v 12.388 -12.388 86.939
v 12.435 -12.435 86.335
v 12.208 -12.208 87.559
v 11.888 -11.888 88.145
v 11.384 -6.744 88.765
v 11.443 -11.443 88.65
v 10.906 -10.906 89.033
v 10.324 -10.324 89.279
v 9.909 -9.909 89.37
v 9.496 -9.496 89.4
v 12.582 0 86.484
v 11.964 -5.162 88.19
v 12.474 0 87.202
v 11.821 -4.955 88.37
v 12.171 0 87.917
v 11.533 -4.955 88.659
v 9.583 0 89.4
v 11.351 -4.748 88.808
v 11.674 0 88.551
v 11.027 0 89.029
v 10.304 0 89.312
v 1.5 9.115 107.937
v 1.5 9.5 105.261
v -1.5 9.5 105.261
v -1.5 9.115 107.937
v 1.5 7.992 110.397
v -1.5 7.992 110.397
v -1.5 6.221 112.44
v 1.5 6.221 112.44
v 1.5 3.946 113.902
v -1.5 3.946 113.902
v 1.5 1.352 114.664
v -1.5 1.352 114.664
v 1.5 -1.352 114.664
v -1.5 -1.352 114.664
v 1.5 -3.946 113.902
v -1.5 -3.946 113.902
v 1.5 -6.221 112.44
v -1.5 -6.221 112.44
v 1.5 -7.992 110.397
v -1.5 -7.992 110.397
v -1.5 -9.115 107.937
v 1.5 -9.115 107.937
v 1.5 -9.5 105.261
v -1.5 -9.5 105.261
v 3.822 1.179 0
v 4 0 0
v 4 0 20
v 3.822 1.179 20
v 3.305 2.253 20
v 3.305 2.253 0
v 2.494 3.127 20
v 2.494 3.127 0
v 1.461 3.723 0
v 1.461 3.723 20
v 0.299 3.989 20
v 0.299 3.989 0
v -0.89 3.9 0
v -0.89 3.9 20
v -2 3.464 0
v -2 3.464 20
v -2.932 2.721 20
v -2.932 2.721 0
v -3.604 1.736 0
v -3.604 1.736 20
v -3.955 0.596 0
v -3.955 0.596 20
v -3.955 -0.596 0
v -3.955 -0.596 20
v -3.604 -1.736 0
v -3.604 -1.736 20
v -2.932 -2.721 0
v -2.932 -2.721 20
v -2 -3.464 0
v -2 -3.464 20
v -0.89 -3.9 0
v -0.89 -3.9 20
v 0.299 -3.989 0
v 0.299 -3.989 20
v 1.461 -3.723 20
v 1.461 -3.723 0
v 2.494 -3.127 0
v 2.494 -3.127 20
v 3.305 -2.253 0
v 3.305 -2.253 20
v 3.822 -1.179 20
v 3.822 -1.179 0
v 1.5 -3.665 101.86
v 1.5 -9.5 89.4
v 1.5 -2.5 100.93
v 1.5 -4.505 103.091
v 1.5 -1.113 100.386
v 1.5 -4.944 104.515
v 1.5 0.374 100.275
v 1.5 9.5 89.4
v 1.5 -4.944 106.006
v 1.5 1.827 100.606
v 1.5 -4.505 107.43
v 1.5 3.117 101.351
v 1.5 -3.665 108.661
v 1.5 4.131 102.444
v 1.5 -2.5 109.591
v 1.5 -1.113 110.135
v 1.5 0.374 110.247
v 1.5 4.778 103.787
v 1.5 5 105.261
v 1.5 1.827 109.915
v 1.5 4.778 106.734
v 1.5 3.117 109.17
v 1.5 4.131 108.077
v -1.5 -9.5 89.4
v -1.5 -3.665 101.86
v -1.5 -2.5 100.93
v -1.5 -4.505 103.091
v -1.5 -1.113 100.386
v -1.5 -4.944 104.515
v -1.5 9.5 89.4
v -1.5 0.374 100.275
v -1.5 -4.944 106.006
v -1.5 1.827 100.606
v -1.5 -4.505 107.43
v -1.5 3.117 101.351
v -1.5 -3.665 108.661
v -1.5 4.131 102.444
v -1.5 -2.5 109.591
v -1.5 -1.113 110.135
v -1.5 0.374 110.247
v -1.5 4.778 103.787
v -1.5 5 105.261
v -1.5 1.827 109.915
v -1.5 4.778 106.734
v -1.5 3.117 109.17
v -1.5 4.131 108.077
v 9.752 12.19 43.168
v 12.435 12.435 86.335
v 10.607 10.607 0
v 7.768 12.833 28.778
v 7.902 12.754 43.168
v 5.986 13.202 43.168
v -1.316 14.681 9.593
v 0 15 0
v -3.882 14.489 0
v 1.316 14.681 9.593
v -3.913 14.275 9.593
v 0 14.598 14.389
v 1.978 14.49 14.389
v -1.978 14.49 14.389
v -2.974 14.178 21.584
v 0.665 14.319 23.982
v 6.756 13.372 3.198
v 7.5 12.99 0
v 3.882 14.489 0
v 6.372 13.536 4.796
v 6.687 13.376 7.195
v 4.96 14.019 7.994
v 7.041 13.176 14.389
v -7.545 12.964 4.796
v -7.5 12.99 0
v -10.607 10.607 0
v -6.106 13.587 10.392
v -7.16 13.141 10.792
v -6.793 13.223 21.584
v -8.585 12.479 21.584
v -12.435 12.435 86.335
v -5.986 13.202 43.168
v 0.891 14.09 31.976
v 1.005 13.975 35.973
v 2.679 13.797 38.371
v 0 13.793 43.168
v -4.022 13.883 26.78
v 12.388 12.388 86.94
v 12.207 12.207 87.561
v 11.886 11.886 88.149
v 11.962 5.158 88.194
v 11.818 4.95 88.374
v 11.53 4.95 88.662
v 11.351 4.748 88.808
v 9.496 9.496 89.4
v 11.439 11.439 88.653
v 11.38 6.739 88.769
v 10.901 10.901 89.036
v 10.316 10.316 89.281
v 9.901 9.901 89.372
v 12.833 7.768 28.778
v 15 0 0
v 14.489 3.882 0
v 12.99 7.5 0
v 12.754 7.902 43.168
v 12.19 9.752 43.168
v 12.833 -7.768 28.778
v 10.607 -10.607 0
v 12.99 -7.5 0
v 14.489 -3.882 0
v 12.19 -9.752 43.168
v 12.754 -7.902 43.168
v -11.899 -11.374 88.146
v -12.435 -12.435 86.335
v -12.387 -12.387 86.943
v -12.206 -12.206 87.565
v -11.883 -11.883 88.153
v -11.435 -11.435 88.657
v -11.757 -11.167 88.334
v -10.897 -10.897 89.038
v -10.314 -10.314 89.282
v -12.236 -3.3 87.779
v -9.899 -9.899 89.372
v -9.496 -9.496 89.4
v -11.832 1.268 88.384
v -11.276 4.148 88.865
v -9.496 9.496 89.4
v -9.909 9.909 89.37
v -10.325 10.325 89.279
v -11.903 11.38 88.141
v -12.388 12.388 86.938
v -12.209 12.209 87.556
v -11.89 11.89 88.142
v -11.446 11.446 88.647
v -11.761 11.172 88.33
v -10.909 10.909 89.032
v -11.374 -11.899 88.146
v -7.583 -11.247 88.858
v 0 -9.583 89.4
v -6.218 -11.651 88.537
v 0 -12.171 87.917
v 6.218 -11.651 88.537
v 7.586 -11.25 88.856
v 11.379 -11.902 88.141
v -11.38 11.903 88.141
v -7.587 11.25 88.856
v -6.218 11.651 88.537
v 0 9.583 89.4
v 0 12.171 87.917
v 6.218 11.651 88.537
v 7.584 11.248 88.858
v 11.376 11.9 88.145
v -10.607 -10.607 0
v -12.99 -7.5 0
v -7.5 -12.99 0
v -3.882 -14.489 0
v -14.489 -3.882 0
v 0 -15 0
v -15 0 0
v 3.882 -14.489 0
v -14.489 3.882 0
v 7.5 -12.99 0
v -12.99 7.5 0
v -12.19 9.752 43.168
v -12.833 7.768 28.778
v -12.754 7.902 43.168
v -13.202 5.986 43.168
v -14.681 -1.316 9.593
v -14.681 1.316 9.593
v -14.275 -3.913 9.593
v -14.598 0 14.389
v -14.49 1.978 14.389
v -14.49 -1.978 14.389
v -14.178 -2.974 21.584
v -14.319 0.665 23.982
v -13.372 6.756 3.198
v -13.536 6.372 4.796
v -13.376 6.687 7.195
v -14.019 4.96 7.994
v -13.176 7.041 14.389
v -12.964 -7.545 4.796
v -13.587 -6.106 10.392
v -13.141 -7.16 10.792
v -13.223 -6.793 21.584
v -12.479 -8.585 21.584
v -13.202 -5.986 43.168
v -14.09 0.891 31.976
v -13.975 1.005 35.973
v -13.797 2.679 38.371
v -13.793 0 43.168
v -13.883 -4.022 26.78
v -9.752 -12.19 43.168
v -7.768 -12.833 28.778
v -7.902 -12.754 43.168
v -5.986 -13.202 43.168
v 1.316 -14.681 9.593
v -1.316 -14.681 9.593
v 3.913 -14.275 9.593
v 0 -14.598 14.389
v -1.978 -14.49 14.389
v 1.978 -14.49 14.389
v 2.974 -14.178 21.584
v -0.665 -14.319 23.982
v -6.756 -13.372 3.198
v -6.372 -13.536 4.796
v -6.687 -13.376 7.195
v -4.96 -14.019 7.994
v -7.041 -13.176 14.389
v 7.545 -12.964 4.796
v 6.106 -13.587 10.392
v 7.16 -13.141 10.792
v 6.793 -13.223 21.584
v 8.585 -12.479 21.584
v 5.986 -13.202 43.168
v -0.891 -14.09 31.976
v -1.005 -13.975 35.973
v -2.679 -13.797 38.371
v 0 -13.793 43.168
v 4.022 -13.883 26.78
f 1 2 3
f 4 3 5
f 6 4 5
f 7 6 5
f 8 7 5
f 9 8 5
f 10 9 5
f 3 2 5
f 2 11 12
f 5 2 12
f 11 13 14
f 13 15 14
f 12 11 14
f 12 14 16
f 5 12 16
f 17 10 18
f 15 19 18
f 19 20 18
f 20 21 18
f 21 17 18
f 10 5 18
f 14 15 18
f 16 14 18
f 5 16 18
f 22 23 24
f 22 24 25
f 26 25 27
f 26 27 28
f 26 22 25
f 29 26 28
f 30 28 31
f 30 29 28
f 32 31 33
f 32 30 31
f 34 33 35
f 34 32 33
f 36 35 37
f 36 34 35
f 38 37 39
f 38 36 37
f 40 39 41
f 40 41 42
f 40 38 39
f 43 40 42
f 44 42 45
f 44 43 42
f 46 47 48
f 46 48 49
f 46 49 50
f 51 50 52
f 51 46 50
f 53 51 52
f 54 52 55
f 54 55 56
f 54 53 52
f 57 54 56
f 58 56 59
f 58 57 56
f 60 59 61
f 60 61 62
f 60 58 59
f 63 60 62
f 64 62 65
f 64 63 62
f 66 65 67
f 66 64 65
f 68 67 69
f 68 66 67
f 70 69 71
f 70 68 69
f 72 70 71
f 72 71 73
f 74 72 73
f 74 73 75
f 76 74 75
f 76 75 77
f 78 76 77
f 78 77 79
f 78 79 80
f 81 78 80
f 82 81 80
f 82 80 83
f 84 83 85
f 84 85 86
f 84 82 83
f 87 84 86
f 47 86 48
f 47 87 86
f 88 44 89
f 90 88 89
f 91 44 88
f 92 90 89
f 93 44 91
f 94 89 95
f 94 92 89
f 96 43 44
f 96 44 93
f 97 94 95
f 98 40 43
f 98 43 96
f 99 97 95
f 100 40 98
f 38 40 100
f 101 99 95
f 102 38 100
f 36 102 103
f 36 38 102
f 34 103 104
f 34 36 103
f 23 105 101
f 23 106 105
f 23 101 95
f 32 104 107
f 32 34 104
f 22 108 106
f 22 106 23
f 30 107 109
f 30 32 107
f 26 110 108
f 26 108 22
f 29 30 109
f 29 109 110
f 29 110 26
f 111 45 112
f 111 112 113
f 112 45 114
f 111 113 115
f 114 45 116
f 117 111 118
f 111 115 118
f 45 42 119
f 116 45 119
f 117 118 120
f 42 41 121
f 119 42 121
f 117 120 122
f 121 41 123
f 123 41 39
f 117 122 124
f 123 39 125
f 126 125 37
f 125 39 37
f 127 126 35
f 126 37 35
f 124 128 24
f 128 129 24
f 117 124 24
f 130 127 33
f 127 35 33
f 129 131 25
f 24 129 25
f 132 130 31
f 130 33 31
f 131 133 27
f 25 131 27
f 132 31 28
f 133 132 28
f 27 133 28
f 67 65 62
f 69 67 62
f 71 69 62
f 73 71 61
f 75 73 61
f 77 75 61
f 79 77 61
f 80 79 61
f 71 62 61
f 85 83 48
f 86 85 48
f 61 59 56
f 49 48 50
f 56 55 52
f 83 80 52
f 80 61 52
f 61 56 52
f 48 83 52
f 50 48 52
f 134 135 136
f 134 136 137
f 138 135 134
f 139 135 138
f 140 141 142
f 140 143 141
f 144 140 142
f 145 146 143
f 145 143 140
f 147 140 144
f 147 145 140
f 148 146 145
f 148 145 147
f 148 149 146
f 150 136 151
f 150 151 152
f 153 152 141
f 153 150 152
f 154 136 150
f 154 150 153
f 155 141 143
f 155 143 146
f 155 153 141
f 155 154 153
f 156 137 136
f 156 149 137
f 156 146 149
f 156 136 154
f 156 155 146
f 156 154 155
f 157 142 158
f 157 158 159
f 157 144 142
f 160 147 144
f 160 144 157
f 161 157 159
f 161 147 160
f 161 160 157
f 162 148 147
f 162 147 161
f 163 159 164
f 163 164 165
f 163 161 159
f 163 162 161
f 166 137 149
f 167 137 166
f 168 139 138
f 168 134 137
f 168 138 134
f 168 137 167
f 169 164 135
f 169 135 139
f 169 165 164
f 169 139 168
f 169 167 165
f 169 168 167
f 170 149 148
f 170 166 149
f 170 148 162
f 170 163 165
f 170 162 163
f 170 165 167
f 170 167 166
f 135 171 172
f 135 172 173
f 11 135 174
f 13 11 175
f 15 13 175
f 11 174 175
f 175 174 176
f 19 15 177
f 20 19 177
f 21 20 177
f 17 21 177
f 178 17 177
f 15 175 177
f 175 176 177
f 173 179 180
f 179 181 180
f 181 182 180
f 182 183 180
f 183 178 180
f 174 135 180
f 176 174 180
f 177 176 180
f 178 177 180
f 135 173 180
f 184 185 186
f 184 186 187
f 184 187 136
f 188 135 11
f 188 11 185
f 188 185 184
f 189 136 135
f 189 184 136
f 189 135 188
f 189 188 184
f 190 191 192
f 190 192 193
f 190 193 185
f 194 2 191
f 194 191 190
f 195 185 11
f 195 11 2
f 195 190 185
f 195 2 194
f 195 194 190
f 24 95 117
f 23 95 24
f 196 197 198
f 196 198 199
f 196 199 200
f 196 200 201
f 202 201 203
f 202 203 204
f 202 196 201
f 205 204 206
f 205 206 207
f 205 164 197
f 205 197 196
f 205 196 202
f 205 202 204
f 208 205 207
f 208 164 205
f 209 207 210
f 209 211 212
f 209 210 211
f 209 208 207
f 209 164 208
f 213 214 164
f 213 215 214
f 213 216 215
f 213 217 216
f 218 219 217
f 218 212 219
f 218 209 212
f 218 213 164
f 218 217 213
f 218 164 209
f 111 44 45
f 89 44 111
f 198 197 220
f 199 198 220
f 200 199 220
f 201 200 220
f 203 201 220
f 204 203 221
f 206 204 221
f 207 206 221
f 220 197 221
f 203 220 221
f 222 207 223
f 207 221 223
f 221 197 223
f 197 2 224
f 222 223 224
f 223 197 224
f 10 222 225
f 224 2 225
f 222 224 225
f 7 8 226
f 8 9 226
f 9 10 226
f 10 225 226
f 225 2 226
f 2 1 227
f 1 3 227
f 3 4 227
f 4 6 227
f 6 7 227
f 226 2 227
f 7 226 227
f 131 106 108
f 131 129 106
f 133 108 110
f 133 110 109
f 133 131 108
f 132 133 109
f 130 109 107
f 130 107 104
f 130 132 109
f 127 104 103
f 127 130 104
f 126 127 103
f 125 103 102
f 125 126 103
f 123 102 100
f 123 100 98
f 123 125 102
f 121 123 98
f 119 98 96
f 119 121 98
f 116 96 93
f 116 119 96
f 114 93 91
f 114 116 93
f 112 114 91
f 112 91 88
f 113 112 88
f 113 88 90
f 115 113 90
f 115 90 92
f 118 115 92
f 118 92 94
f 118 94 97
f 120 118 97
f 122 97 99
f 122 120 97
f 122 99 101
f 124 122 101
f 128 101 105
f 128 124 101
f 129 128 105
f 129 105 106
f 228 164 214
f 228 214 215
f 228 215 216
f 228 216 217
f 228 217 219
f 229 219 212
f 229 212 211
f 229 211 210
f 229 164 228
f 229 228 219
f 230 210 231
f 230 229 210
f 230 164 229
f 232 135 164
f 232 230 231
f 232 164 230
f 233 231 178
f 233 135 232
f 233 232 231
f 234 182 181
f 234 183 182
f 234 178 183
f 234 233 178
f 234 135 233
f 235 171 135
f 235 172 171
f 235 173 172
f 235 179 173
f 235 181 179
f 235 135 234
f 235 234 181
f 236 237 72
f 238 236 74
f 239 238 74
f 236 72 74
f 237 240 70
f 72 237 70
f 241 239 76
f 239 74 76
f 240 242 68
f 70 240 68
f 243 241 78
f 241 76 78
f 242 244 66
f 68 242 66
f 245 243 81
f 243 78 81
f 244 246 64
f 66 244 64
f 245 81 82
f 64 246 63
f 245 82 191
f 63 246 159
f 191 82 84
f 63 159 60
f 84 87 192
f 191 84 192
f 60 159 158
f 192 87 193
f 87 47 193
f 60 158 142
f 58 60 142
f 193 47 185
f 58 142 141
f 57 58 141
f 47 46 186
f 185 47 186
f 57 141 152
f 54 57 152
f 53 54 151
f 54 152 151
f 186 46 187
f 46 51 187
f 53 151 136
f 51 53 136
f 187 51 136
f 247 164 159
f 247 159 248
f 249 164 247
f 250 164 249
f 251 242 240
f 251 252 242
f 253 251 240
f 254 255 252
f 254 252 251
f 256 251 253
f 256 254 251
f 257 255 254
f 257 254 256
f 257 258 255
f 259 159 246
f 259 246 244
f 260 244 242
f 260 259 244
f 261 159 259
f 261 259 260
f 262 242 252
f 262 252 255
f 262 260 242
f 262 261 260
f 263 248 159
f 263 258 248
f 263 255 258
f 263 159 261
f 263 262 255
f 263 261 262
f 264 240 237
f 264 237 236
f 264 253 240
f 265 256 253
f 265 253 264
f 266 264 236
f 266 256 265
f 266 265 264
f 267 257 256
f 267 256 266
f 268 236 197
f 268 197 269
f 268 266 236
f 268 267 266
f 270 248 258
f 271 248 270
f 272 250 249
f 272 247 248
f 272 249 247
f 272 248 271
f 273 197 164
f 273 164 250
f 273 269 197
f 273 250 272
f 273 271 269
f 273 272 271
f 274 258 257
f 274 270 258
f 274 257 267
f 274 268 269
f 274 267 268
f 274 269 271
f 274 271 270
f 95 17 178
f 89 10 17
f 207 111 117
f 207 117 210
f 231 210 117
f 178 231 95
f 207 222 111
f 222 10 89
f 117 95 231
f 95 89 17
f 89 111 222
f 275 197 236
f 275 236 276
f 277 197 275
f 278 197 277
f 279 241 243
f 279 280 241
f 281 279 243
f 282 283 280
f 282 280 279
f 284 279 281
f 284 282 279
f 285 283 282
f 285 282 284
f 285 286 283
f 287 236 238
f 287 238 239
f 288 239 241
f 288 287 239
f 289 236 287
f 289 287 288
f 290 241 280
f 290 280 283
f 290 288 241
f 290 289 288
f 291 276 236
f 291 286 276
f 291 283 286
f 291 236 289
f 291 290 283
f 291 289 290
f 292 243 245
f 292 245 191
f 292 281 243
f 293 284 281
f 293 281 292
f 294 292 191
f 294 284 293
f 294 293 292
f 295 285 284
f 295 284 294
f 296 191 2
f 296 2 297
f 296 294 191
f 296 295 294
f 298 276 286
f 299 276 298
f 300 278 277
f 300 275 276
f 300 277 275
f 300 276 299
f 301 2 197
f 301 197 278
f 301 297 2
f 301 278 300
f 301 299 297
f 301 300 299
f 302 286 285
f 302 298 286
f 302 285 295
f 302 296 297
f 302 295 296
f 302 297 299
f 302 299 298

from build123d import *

# Parameters (mm, degrees)
F0_R     = 15
F2_W     = 25
F2_H     = 25
F4_R     = 3
F5_R     = 5
F6_DEPTH = 1.5
F7_R     = 4
F8_DEPTH = 20


with BuildPart() as f3:
    # F0 (on Top) → F3 section 0
    with BuildSketch(Plane.XY):
        Circle(F0_R)
    # F2 (on offset) → F3 section 1
    with BuildSketch(Plane.XY.offset(89.4)):
        Rectangle(F2_W, F2_H)
    loft()

    # F4
    f4_edges = [f3.edges().sort_by_distance(p)[0] for p in [
        (12.5, 6.25, 89.4),
        (12.5, -6.25, 89.4),
        (0, 12.5, 89.4),
        (-12.5, 0, 89.4),
        (0, -12.5, 89.4),
    ]]
    fillet(f4_edges, radius=F4_R)

    # F5 (on Right) → F6 (join, symmetric)
    with BuildSketch(Plane.YZ):
        with BuildLine():
            Line((9.5, 83.3456217407), (9.5, 105.2605534294))
            ThreePointArc((9.5, 105.2605534294), (0, 95.7605534294), (-9.5, 105.2605534294))
            Line((-9.5, 105.2605534294), (-9.5, 83.3456217407))
            Line((-9.5, 83.3456217407), (9.5, 83.3456217407))
        make_face()
        with BuildLine():
            ThreePointArc((-9.5, 105.2605534294), (0, 95.7605534294), (9.5, 105.2605534294))
            ThreePointArc((9.5, 105.2605534294), (0, 114.7605534294), (-9.5, 105.2605534294))
        make_face()
        with Locations((0, 105.2605534294)):
            Circle(F5_R, mode=Mode.SUBTRACT)
    extrude(amount=F6_DEPTH, both=True)

    # F7 (on Top) → F8 (cut)
    with BuildSketch(Plane.XY):
        Circle(F7_R)
    extrude(amount=F8_DEPTH, mode=Mode.SUBTRACT)


solid = f3.part
